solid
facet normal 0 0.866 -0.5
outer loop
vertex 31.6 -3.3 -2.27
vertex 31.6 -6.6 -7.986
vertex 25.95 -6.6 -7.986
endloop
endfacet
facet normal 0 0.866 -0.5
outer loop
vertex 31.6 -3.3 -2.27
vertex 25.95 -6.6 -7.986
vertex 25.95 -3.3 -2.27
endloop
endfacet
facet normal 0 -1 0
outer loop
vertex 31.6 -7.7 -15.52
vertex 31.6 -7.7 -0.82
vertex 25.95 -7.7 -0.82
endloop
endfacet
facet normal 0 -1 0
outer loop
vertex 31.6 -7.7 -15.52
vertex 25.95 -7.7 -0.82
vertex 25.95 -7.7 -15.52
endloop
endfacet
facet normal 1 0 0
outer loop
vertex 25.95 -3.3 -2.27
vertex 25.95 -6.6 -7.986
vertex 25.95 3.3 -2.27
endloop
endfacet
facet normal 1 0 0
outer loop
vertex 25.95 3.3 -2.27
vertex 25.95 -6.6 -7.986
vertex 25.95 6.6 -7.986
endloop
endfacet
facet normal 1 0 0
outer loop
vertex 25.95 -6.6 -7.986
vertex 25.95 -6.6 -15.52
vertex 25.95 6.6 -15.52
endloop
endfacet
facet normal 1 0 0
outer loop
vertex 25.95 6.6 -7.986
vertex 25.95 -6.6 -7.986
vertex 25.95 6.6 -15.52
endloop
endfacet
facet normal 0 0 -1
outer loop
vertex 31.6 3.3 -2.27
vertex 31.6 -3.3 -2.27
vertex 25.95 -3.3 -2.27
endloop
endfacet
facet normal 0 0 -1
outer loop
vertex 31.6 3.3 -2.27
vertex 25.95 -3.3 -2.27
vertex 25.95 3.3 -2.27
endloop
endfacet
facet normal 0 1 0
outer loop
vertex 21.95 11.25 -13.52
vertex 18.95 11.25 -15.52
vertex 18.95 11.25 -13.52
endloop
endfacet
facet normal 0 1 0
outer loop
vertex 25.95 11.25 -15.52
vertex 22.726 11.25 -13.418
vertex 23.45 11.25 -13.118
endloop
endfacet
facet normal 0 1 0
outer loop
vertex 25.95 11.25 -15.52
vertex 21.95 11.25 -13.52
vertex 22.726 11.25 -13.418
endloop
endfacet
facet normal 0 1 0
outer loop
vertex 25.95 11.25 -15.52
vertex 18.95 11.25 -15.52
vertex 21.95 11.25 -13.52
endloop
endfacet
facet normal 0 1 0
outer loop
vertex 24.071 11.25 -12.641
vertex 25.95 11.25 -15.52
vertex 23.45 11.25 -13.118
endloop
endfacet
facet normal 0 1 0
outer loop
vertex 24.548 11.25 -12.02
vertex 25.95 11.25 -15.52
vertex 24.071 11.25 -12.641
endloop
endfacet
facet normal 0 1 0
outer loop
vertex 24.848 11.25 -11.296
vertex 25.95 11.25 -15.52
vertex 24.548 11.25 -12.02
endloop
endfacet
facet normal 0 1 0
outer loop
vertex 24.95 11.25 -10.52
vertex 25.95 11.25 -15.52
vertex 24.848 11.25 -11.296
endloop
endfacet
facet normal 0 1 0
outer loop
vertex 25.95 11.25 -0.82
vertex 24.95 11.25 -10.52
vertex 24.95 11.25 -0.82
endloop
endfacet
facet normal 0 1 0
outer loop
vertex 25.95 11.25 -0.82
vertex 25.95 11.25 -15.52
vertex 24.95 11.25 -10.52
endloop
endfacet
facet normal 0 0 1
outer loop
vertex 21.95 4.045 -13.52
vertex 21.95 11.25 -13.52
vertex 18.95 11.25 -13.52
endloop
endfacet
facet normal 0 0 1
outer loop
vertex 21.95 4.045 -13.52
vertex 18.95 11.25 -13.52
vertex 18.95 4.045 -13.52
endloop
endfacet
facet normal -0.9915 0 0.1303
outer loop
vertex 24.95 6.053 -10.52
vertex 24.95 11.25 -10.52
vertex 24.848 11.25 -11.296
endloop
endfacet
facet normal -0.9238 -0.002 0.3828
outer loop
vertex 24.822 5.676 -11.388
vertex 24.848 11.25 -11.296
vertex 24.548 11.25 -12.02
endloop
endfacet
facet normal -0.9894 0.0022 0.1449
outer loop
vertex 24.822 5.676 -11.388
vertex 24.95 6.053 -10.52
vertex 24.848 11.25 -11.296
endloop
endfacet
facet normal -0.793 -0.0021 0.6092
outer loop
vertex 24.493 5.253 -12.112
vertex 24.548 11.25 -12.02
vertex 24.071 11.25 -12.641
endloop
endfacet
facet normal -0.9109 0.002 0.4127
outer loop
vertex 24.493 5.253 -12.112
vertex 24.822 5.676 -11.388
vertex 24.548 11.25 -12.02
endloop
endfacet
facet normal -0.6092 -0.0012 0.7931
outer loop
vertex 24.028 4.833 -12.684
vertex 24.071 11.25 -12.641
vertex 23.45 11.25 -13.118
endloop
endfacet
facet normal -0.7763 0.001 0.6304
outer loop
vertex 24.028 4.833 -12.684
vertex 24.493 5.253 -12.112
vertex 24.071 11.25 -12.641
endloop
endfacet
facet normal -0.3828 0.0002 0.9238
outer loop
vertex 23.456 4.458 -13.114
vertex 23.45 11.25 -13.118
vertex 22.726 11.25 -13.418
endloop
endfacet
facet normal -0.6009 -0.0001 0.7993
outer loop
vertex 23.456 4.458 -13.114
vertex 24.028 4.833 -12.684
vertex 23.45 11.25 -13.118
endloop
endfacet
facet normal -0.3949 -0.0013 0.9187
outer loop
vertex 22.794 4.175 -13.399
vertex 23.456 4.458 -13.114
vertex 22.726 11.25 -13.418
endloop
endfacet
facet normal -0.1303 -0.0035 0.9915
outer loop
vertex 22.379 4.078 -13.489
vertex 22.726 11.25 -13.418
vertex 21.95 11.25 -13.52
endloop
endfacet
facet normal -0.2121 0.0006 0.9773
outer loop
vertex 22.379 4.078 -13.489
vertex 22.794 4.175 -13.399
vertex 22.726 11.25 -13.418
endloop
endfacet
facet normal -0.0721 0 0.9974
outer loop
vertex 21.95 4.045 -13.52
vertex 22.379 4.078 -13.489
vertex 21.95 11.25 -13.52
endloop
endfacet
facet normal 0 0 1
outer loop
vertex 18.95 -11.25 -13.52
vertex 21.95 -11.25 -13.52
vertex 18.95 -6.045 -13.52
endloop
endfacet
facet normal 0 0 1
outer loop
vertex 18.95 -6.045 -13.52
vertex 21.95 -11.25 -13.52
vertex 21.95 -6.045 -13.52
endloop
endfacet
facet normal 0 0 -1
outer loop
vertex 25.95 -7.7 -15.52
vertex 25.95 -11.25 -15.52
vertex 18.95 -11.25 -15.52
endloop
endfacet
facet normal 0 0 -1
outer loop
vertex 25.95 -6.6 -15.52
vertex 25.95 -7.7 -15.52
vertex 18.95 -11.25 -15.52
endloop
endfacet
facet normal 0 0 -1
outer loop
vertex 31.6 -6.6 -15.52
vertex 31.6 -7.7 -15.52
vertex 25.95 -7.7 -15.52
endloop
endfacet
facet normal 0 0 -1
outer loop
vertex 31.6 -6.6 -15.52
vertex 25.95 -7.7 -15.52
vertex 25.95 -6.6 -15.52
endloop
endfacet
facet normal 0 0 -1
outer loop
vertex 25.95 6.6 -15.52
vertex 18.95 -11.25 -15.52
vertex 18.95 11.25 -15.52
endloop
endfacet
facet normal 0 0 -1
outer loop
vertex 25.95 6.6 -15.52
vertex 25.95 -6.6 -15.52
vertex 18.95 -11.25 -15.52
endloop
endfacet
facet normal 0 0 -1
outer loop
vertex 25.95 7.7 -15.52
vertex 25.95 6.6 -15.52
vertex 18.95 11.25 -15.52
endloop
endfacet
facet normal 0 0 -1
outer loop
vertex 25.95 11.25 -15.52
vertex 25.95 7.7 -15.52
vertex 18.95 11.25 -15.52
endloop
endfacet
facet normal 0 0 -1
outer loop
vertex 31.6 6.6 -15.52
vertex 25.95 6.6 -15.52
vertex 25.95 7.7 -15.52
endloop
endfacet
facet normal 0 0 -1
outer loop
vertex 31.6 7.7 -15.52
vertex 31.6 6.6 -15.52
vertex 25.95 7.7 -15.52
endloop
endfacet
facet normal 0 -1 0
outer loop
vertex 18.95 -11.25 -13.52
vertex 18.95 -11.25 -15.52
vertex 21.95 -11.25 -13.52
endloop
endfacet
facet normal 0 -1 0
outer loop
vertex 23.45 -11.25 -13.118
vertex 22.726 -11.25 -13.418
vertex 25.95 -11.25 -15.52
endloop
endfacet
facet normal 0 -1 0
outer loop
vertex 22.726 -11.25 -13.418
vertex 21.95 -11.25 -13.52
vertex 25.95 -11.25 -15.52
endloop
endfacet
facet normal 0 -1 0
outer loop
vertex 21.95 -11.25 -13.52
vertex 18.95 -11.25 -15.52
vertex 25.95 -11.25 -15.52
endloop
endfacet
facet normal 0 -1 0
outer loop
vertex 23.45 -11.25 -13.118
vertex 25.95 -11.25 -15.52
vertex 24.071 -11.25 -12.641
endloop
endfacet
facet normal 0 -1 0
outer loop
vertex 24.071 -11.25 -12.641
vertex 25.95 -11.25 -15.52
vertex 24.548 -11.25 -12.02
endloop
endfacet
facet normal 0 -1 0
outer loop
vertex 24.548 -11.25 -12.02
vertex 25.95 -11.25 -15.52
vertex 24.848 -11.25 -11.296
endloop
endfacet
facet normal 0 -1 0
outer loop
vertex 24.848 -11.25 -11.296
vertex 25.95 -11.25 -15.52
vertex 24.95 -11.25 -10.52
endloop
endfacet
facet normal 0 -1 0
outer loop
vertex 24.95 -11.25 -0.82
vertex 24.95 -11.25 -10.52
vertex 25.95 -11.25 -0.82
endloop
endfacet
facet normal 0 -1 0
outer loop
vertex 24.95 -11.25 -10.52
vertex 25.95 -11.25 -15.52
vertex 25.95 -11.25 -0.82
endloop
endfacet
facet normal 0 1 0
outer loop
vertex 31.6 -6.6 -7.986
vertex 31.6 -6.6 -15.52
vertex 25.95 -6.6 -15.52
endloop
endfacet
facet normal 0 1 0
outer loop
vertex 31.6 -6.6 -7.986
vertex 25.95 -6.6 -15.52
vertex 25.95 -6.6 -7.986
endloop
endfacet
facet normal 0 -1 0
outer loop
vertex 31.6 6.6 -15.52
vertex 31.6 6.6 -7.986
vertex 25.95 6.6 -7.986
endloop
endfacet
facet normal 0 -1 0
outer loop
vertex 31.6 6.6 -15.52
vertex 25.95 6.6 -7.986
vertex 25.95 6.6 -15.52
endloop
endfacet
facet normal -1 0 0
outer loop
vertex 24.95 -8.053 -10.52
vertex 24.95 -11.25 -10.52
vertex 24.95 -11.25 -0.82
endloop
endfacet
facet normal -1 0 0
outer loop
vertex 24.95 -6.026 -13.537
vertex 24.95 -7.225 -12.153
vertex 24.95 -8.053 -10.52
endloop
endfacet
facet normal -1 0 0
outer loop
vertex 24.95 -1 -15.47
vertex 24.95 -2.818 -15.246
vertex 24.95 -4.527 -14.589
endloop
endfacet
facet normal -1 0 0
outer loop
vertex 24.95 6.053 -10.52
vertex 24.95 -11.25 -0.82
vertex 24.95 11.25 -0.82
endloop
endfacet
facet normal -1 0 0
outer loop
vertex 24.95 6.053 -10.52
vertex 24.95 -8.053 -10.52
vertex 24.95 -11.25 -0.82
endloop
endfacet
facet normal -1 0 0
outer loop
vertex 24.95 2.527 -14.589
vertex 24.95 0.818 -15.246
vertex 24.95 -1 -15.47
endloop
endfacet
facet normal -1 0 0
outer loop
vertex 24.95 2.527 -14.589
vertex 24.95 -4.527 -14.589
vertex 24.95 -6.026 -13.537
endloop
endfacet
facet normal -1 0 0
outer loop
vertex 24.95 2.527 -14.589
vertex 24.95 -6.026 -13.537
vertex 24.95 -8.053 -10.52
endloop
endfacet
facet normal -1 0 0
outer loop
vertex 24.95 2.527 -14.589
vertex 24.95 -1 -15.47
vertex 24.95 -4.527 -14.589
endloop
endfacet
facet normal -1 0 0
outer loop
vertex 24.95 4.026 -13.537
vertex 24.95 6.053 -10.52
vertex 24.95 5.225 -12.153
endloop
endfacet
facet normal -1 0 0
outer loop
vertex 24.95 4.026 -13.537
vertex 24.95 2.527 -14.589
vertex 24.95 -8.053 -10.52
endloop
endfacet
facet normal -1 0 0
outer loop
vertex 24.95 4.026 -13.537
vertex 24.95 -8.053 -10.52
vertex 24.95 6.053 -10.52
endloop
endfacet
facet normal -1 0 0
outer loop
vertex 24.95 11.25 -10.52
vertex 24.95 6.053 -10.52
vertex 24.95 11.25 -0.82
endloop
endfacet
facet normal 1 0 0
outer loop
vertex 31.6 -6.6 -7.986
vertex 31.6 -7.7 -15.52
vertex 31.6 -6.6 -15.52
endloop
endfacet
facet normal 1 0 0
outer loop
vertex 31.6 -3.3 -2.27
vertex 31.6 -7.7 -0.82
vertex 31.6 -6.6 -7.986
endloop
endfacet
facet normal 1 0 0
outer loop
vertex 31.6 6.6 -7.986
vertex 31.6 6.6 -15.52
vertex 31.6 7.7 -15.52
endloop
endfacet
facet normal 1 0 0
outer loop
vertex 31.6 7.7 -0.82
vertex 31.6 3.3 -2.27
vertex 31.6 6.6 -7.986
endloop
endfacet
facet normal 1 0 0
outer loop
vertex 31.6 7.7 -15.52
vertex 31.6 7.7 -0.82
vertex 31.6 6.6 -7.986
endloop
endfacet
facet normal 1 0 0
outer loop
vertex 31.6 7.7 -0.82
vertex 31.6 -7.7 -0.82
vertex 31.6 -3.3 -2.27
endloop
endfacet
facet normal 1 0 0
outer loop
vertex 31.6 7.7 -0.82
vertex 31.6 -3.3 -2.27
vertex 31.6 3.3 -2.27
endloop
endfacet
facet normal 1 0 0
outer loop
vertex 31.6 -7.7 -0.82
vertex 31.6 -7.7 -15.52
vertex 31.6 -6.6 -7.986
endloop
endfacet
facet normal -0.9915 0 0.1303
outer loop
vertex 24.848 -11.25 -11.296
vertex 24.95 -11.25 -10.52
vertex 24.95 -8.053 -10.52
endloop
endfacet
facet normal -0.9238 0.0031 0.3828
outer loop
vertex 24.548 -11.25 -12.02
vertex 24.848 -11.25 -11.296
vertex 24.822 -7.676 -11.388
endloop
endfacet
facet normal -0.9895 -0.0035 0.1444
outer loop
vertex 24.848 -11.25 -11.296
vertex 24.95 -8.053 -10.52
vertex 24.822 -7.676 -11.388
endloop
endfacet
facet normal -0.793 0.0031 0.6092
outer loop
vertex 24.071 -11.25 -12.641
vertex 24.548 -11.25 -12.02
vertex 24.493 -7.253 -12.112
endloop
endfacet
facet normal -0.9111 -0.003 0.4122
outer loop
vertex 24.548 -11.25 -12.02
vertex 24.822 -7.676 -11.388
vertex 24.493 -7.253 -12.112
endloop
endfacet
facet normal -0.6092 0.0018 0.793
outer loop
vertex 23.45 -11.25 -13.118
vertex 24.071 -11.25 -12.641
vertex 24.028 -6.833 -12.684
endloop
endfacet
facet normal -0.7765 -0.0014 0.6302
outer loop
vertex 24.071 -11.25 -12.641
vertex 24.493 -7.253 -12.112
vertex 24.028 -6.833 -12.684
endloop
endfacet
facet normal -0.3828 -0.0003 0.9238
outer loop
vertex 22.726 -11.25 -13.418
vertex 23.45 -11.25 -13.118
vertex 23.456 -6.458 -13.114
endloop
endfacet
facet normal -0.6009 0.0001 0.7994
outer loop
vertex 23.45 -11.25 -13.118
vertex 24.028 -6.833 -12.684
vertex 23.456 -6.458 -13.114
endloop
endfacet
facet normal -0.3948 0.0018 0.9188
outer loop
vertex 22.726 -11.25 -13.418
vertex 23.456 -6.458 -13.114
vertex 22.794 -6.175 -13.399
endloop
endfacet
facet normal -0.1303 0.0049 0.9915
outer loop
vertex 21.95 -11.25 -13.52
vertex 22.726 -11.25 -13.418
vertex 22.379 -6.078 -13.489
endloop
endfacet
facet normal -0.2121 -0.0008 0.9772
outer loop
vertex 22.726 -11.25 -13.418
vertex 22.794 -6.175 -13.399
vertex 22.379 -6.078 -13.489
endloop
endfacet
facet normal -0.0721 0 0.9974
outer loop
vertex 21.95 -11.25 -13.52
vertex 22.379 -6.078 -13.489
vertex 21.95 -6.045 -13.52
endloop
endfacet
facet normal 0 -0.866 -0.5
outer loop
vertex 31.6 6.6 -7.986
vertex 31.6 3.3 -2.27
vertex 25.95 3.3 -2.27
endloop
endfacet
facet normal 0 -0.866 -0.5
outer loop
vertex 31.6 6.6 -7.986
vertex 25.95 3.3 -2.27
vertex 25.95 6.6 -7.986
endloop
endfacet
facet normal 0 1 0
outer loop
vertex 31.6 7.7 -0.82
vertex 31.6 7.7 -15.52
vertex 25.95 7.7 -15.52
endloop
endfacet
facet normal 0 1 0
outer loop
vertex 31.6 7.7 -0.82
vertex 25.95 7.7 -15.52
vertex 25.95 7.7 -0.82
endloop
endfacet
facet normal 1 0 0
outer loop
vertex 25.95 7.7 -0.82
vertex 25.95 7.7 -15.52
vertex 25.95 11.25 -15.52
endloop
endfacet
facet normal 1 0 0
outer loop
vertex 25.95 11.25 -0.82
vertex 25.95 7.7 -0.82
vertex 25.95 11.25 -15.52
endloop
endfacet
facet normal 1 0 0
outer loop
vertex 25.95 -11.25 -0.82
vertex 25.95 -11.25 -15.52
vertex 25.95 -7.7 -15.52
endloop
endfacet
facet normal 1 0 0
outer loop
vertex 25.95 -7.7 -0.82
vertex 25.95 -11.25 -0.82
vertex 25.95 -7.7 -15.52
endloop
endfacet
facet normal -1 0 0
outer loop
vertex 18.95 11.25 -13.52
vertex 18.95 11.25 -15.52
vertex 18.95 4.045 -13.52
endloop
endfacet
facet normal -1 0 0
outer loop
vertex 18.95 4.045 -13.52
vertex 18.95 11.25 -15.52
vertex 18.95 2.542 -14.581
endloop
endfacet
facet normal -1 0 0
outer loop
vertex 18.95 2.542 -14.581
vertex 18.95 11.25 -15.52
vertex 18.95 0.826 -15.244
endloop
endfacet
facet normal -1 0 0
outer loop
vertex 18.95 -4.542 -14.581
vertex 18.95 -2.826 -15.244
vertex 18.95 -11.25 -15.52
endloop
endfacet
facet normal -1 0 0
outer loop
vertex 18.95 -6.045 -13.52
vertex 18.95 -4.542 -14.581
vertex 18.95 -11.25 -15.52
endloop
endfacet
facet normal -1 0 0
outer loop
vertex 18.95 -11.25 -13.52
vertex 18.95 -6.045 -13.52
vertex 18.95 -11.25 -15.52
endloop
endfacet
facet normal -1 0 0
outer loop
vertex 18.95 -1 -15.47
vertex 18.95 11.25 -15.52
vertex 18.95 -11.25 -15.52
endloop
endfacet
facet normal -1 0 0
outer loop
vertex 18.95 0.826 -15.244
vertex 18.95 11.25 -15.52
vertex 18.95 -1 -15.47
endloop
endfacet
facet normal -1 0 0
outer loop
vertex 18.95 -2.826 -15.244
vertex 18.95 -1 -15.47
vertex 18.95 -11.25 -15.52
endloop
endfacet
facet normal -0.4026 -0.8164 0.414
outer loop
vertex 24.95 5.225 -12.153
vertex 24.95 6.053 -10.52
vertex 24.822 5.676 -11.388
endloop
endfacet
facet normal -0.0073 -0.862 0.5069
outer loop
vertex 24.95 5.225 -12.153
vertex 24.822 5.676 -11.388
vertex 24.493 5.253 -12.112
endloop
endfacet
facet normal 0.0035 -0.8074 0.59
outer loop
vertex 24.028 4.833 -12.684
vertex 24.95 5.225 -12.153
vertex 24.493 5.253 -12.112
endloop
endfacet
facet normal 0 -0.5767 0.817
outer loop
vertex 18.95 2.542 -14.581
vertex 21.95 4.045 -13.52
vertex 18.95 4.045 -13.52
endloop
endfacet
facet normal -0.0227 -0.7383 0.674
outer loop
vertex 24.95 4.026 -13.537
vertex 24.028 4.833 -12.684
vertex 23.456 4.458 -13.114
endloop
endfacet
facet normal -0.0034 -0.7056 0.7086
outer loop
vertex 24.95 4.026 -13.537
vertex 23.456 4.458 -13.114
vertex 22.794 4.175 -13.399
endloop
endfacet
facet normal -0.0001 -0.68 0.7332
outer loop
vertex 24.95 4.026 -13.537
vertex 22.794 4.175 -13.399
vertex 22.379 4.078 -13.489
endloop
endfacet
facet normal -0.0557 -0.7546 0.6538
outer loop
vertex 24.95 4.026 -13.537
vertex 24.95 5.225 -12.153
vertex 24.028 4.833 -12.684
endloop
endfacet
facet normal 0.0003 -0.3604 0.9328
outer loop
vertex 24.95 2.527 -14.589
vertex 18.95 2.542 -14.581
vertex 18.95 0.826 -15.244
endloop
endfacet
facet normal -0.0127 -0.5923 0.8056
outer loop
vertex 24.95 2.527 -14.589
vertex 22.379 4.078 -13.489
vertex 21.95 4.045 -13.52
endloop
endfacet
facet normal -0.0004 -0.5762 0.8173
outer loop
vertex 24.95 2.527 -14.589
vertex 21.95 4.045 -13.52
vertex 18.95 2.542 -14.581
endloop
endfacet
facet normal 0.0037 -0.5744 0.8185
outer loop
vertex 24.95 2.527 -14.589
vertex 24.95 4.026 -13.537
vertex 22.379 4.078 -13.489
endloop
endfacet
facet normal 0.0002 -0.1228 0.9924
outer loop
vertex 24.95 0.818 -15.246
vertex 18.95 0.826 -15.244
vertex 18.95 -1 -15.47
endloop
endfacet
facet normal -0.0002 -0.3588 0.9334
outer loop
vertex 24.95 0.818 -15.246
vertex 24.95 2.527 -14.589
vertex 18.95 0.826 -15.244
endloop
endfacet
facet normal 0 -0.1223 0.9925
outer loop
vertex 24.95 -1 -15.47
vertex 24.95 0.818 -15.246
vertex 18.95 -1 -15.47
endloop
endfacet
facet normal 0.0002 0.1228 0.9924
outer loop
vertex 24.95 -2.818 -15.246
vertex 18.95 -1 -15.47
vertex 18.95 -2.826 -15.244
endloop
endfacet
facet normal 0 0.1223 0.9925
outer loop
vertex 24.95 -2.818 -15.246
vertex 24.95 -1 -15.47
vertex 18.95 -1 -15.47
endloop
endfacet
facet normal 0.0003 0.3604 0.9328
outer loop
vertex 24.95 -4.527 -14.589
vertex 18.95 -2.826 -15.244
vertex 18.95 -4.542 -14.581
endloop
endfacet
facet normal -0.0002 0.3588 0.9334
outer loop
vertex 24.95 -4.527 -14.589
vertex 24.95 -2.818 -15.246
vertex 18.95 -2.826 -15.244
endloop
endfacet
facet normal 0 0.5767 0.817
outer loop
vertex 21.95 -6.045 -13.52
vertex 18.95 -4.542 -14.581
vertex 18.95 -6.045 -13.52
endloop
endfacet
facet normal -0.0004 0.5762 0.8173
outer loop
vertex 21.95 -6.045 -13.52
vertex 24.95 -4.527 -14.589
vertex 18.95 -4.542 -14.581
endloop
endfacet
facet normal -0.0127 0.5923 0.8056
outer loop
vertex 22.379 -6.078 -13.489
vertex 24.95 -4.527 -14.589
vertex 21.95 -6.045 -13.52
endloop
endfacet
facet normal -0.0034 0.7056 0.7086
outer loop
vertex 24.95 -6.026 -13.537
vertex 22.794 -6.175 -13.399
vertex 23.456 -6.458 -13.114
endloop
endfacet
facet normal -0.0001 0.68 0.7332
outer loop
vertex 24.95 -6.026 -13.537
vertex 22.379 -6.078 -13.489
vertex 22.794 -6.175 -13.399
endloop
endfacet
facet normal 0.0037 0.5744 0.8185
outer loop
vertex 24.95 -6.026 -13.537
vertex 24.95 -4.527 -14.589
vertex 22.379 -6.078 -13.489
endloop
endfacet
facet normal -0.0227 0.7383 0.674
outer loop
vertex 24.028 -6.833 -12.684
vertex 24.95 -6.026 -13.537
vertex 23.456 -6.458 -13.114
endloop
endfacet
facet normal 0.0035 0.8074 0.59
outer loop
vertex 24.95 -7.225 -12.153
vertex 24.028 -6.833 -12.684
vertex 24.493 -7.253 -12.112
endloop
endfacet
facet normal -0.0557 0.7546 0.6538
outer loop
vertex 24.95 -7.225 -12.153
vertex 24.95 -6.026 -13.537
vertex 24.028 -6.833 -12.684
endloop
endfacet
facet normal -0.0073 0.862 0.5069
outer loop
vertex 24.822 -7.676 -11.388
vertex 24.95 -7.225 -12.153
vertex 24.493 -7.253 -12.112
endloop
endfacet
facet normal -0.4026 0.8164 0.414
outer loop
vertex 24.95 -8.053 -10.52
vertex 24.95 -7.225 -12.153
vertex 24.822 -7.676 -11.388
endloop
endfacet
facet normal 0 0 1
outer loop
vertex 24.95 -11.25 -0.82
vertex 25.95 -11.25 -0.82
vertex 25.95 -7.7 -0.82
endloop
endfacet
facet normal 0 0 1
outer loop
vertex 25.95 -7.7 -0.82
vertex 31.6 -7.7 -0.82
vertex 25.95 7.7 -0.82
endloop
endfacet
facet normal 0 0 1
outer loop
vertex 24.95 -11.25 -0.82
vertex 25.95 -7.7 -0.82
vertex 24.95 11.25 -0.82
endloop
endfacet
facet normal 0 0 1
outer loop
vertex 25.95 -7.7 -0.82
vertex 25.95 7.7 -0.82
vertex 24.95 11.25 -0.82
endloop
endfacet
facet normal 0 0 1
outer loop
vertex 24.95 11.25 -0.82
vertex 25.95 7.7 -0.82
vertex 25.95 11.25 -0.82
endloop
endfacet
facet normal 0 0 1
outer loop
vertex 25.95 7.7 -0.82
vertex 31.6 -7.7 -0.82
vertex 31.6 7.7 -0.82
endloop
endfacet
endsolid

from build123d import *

# Parameters (mm, degrees)
PAD011_DEPTH = 5.65
SKETCH019_W  = 22.5
SKETCH019_H  = 14.7
PAD012_DEPTH = 1
PAD016_DEPTH = 6
FILLET_R     = 3


with BuildPart() as part:
    # Sketch018 → Pad011 (new body)
    with BuildSketch(Plane.YZ.offset(31.6)):
        Polygon((-6.6, -7.985767665), (-3.3, -2.27), (3.3, -2.27), (6.6, -7.985767665), (6.6, -15.52), (7.7, -15.52), (7.7, -0.82), (-7.7, -0.82), (-7.7, -15.52), (-6.6, -15.52), align=None)
    extrude(amount=-PAD011_DEPTH)

    # Sketch019 → Pad012 (new body)
    with BuildSketch(Plane(origin=(25.95, 0, 0), x_dir=(0, 1, 0), z_dir=(-1, 0, 0))):
        with Locations((0, 8.17)):
            Rectangle(SKETCH019_W, SKETCH019_H)
    extrude(amount=PAD012_DEPTH)

    # Sketch027 → Pad016 (new body)
    with BuildSketch(Plane(origin=(24.95, 0, 0), x_dir=(0, 1, 0), z_dir=(-1, 0, 0))):
        with BuildLine():
            Line((-11.25, 15.52), (11.25, 15.52))
            Line((11.25, 15.52), (11.25, 13.52))
            Line((11.25, 13.52), (4.0445515162, 13.52))
            ThreePointArc((4.0445515162, 13.52), (-1, 15.47), (-6.0445515162, 13.52))
            Line((-11.25, 13.52), (-6.0445515162, 13.52))
            Line((-11.25, 15.52), (-11.25, 13.52))
        make_face()
    extrude(amount=PAD016_DEPTH)

    # Fillet
    fillet_edges = [part.edges().sort_by_distance(p)[0] for p in [
        (24.95, -8.647276, -13.52),
        (24.95, 7.647276, -13.52),
    ]]
    fillet(fillet_edges, radius=FILLET_R)


solid = part.part
